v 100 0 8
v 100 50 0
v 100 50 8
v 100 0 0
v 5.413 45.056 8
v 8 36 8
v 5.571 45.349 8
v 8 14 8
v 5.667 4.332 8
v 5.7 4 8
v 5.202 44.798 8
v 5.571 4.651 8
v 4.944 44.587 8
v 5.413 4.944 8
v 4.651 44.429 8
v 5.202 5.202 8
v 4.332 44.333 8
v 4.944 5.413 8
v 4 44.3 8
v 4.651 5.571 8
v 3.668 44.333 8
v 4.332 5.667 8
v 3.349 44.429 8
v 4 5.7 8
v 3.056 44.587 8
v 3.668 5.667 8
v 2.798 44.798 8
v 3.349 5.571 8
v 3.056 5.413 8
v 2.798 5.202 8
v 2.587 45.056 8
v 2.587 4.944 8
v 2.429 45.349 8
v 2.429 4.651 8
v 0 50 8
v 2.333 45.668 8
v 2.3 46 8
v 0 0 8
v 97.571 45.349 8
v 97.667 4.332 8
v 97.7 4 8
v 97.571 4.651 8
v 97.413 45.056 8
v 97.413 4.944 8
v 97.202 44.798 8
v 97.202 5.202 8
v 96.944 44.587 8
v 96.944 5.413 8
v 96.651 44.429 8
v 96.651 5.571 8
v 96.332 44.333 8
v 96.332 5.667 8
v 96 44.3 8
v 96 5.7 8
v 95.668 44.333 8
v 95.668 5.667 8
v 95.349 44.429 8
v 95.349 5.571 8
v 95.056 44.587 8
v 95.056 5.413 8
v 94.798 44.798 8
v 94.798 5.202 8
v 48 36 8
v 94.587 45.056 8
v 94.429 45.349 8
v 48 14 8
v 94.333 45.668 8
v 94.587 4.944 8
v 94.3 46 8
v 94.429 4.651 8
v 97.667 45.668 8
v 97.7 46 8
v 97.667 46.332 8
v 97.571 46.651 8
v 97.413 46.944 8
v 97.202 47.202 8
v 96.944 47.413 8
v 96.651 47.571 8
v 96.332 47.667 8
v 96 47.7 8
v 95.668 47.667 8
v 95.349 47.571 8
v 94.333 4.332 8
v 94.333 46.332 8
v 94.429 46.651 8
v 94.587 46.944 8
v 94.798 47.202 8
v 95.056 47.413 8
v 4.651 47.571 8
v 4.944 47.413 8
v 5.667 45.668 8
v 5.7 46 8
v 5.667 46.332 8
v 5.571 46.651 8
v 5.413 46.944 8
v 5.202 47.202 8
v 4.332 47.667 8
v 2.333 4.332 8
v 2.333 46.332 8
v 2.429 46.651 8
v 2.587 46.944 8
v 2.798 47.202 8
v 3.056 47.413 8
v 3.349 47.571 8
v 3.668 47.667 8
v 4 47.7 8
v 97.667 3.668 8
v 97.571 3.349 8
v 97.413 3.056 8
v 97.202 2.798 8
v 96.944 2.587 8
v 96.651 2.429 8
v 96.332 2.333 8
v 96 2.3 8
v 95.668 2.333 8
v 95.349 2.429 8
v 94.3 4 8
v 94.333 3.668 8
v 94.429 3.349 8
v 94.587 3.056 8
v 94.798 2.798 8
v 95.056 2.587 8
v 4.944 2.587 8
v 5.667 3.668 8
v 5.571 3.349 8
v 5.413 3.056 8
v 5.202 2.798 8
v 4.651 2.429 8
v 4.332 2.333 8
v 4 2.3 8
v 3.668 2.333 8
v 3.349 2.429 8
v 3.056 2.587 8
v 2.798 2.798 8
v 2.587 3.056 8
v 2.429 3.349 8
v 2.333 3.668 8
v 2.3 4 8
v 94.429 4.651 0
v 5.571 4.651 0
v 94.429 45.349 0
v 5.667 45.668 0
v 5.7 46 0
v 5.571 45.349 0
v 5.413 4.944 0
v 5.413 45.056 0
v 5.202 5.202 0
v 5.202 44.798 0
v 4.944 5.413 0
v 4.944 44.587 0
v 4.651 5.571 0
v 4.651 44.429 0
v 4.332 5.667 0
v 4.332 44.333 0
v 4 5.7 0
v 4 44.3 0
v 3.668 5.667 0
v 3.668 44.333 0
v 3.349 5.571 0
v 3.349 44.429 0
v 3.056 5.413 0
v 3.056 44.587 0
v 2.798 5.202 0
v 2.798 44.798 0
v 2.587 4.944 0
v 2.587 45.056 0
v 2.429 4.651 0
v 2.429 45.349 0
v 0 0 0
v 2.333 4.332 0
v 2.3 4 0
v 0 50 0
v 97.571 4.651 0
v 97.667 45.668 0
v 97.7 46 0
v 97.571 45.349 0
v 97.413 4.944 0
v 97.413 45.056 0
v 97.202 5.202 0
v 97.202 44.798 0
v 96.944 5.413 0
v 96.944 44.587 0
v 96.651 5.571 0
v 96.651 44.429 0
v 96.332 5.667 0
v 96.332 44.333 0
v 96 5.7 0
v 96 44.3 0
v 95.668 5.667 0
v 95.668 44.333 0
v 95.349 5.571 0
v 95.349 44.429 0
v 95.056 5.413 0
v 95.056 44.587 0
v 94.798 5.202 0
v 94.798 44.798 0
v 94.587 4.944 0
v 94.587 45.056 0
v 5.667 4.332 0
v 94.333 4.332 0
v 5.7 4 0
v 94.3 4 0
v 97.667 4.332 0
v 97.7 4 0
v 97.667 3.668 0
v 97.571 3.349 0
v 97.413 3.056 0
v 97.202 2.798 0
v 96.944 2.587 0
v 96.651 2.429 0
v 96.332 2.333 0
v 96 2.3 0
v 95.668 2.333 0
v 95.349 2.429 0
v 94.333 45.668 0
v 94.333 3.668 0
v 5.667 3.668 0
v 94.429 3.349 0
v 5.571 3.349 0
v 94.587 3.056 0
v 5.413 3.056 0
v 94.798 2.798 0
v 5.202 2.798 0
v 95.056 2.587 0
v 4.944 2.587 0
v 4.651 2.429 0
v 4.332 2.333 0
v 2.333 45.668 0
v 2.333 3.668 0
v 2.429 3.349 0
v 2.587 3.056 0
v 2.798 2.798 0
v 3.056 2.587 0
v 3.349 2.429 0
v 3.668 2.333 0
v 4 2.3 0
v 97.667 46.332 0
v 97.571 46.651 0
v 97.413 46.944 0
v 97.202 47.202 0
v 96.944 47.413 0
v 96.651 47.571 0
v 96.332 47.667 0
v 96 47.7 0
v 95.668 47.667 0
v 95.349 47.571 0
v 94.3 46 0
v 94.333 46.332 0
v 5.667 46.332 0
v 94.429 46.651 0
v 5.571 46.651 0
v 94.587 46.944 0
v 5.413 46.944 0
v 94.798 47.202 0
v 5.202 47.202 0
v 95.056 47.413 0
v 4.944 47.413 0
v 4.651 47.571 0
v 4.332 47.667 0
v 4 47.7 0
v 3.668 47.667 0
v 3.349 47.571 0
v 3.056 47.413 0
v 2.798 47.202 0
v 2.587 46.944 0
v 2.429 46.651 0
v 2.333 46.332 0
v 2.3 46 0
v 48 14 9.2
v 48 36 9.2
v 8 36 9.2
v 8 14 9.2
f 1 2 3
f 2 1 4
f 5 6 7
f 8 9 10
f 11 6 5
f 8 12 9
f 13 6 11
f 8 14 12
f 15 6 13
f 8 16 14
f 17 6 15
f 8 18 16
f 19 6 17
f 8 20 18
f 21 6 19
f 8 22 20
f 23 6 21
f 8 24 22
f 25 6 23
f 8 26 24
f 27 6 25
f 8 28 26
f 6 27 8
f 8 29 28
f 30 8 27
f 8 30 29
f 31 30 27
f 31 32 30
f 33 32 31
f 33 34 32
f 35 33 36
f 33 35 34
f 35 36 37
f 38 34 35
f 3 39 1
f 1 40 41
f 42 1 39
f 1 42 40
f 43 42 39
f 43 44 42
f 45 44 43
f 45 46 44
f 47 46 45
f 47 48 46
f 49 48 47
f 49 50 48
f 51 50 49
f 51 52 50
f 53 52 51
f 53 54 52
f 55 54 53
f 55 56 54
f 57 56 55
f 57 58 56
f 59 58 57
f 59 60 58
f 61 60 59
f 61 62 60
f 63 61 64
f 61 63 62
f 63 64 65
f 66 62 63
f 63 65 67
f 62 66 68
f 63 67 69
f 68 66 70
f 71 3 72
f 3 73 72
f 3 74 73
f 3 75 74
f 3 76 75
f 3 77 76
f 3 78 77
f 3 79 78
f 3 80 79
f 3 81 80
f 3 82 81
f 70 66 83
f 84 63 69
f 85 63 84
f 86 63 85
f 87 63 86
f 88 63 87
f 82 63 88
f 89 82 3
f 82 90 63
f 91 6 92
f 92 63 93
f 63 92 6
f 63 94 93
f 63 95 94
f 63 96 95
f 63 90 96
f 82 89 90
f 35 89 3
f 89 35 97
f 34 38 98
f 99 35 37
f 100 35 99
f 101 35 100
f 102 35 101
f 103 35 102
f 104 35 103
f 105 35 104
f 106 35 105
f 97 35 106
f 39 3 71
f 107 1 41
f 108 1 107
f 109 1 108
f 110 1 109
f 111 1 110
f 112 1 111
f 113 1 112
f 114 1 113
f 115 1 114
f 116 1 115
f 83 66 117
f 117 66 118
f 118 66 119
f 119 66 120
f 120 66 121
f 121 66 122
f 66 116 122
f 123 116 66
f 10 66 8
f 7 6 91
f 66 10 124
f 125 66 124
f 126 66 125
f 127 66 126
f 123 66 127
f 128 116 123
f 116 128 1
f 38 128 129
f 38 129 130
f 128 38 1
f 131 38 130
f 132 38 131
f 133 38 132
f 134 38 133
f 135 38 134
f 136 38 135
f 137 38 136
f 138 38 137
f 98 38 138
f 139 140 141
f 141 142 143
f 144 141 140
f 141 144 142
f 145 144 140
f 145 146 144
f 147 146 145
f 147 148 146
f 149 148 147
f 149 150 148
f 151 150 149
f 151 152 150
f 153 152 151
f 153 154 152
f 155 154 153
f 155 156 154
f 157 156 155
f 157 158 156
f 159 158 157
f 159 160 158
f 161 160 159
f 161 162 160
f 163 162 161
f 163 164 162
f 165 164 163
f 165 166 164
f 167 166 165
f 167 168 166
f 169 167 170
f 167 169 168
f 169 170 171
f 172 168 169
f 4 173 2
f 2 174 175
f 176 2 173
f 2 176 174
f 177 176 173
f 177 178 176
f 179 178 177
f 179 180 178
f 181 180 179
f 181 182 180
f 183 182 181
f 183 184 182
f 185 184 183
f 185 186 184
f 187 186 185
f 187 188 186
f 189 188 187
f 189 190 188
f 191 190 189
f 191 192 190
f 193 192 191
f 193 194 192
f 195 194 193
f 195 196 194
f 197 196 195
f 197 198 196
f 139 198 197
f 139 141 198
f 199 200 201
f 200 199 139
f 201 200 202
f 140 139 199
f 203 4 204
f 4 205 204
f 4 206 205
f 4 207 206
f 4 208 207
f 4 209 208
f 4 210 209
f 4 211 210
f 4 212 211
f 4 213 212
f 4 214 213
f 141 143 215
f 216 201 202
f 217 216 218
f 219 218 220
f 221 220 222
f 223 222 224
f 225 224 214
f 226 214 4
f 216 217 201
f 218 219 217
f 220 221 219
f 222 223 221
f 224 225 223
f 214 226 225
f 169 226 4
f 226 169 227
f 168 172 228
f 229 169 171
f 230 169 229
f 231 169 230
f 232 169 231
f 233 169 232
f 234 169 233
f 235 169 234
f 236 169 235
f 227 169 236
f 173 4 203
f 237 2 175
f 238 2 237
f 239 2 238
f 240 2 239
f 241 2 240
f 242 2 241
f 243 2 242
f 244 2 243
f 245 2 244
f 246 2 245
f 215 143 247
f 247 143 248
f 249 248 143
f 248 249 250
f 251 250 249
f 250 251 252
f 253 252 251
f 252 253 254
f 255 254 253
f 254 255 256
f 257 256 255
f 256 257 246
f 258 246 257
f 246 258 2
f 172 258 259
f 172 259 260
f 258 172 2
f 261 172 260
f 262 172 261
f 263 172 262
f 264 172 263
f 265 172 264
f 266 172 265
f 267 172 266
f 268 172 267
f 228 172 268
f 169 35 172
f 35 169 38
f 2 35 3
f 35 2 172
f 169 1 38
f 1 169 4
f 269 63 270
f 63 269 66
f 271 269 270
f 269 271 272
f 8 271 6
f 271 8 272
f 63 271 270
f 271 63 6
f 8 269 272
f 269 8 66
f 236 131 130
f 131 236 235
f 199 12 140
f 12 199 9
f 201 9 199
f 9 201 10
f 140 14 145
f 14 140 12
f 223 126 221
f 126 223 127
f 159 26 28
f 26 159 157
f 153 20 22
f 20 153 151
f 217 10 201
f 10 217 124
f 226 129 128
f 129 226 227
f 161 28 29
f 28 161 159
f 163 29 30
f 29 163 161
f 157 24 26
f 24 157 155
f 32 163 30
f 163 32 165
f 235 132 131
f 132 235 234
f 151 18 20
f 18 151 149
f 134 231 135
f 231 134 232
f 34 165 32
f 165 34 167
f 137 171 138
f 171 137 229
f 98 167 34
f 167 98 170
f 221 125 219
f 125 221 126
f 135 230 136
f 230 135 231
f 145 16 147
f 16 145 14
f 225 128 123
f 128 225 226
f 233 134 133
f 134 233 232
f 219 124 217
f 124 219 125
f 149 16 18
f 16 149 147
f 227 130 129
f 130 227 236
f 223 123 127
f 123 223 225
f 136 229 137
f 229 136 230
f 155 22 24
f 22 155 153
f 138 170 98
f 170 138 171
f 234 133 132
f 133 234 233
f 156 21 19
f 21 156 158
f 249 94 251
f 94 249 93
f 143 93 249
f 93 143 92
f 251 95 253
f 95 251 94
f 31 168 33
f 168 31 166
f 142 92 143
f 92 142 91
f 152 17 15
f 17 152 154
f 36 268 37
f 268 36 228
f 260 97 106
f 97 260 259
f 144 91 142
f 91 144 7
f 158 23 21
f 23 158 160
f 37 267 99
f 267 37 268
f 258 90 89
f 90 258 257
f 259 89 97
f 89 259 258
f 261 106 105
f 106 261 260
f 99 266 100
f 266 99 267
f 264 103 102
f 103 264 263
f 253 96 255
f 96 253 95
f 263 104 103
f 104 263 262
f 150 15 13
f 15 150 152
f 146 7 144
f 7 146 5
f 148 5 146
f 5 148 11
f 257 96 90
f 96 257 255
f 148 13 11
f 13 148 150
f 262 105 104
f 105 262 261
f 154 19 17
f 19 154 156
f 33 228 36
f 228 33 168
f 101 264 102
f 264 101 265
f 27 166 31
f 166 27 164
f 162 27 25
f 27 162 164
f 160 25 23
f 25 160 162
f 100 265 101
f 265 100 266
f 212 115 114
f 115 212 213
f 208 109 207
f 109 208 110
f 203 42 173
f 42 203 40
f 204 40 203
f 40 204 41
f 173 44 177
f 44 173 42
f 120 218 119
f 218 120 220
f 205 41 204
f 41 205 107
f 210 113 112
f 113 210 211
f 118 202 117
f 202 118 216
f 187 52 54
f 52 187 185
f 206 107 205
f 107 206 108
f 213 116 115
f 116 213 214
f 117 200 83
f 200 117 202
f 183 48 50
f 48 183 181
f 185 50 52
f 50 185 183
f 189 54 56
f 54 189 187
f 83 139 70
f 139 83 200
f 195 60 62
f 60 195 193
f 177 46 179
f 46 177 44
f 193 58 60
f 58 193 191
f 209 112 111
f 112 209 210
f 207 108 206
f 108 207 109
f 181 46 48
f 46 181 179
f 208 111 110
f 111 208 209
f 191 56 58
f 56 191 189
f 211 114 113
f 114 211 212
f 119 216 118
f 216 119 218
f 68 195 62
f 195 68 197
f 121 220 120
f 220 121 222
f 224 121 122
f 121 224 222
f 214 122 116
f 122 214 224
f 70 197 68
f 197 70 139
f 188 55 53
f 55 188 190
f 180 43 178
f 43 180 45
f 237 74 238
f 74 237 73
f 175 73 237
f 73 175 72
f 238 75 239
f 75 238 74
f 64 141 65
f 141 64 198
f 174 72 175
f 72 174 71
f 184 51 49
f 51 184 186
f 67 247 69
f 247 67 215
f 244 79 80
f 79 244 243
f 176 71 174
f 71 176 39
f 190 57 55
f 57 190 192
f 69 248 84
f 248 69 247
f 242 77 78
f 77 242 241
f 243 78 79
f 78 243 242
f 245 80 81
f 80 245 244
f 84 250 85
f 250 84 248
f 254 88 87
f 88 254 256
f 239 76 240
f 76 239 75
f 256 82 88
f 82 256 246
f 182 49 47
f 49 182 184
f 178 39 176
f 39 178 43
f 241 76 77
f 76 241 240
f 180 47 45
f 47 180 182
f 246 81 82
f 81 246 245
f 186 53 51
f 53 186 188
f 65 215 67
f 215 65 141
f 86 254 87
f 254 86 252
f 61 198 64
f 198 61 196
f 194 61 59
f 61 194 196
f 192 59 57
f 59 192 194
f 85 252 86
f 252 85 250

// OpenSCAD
$fn = 32;

// ----------------------------------------------------------------------
// Enclosure lid: 100 x 50 x 8 mm, 4 bolt holes
// ----------------------------------------------------------------------

// --- parameters (mm) ---
length = 100;             // lid length, X
width = 50;               // lid width, Y
plate_t = 8;              // lid plate thickness
bolt_d = 3.4;             // bolt clearance
boss_lip = 4;             // bolt hole inset from the corner
sink = 1;                 // overlap of the lip and ribs into the plate
label_h = 1.2;            // raised marking pad

module plate() {
  cube([length, width, plate_t]);
  /* raised marking pad on top, sunk 1 mm into the plate */
  translate([length * 0.08, width * 0.28, plate_t - 1]) cube([length * 0.4, width * 0.44, label_h + 1]);
}

difference() {
  plate();
  /* bolt pattern matching the corner bosses */
  for (sx = [0, 1]) for (sy = [0, 1])
    translate([sx * (length - 2 * boss_lip) + boss_lip, sy * (width - 2 * boss_lip) + boss_lip, -0 - 1])
      cylinder(h = plate_t + 0 + 2, d = bolt_d);
}
